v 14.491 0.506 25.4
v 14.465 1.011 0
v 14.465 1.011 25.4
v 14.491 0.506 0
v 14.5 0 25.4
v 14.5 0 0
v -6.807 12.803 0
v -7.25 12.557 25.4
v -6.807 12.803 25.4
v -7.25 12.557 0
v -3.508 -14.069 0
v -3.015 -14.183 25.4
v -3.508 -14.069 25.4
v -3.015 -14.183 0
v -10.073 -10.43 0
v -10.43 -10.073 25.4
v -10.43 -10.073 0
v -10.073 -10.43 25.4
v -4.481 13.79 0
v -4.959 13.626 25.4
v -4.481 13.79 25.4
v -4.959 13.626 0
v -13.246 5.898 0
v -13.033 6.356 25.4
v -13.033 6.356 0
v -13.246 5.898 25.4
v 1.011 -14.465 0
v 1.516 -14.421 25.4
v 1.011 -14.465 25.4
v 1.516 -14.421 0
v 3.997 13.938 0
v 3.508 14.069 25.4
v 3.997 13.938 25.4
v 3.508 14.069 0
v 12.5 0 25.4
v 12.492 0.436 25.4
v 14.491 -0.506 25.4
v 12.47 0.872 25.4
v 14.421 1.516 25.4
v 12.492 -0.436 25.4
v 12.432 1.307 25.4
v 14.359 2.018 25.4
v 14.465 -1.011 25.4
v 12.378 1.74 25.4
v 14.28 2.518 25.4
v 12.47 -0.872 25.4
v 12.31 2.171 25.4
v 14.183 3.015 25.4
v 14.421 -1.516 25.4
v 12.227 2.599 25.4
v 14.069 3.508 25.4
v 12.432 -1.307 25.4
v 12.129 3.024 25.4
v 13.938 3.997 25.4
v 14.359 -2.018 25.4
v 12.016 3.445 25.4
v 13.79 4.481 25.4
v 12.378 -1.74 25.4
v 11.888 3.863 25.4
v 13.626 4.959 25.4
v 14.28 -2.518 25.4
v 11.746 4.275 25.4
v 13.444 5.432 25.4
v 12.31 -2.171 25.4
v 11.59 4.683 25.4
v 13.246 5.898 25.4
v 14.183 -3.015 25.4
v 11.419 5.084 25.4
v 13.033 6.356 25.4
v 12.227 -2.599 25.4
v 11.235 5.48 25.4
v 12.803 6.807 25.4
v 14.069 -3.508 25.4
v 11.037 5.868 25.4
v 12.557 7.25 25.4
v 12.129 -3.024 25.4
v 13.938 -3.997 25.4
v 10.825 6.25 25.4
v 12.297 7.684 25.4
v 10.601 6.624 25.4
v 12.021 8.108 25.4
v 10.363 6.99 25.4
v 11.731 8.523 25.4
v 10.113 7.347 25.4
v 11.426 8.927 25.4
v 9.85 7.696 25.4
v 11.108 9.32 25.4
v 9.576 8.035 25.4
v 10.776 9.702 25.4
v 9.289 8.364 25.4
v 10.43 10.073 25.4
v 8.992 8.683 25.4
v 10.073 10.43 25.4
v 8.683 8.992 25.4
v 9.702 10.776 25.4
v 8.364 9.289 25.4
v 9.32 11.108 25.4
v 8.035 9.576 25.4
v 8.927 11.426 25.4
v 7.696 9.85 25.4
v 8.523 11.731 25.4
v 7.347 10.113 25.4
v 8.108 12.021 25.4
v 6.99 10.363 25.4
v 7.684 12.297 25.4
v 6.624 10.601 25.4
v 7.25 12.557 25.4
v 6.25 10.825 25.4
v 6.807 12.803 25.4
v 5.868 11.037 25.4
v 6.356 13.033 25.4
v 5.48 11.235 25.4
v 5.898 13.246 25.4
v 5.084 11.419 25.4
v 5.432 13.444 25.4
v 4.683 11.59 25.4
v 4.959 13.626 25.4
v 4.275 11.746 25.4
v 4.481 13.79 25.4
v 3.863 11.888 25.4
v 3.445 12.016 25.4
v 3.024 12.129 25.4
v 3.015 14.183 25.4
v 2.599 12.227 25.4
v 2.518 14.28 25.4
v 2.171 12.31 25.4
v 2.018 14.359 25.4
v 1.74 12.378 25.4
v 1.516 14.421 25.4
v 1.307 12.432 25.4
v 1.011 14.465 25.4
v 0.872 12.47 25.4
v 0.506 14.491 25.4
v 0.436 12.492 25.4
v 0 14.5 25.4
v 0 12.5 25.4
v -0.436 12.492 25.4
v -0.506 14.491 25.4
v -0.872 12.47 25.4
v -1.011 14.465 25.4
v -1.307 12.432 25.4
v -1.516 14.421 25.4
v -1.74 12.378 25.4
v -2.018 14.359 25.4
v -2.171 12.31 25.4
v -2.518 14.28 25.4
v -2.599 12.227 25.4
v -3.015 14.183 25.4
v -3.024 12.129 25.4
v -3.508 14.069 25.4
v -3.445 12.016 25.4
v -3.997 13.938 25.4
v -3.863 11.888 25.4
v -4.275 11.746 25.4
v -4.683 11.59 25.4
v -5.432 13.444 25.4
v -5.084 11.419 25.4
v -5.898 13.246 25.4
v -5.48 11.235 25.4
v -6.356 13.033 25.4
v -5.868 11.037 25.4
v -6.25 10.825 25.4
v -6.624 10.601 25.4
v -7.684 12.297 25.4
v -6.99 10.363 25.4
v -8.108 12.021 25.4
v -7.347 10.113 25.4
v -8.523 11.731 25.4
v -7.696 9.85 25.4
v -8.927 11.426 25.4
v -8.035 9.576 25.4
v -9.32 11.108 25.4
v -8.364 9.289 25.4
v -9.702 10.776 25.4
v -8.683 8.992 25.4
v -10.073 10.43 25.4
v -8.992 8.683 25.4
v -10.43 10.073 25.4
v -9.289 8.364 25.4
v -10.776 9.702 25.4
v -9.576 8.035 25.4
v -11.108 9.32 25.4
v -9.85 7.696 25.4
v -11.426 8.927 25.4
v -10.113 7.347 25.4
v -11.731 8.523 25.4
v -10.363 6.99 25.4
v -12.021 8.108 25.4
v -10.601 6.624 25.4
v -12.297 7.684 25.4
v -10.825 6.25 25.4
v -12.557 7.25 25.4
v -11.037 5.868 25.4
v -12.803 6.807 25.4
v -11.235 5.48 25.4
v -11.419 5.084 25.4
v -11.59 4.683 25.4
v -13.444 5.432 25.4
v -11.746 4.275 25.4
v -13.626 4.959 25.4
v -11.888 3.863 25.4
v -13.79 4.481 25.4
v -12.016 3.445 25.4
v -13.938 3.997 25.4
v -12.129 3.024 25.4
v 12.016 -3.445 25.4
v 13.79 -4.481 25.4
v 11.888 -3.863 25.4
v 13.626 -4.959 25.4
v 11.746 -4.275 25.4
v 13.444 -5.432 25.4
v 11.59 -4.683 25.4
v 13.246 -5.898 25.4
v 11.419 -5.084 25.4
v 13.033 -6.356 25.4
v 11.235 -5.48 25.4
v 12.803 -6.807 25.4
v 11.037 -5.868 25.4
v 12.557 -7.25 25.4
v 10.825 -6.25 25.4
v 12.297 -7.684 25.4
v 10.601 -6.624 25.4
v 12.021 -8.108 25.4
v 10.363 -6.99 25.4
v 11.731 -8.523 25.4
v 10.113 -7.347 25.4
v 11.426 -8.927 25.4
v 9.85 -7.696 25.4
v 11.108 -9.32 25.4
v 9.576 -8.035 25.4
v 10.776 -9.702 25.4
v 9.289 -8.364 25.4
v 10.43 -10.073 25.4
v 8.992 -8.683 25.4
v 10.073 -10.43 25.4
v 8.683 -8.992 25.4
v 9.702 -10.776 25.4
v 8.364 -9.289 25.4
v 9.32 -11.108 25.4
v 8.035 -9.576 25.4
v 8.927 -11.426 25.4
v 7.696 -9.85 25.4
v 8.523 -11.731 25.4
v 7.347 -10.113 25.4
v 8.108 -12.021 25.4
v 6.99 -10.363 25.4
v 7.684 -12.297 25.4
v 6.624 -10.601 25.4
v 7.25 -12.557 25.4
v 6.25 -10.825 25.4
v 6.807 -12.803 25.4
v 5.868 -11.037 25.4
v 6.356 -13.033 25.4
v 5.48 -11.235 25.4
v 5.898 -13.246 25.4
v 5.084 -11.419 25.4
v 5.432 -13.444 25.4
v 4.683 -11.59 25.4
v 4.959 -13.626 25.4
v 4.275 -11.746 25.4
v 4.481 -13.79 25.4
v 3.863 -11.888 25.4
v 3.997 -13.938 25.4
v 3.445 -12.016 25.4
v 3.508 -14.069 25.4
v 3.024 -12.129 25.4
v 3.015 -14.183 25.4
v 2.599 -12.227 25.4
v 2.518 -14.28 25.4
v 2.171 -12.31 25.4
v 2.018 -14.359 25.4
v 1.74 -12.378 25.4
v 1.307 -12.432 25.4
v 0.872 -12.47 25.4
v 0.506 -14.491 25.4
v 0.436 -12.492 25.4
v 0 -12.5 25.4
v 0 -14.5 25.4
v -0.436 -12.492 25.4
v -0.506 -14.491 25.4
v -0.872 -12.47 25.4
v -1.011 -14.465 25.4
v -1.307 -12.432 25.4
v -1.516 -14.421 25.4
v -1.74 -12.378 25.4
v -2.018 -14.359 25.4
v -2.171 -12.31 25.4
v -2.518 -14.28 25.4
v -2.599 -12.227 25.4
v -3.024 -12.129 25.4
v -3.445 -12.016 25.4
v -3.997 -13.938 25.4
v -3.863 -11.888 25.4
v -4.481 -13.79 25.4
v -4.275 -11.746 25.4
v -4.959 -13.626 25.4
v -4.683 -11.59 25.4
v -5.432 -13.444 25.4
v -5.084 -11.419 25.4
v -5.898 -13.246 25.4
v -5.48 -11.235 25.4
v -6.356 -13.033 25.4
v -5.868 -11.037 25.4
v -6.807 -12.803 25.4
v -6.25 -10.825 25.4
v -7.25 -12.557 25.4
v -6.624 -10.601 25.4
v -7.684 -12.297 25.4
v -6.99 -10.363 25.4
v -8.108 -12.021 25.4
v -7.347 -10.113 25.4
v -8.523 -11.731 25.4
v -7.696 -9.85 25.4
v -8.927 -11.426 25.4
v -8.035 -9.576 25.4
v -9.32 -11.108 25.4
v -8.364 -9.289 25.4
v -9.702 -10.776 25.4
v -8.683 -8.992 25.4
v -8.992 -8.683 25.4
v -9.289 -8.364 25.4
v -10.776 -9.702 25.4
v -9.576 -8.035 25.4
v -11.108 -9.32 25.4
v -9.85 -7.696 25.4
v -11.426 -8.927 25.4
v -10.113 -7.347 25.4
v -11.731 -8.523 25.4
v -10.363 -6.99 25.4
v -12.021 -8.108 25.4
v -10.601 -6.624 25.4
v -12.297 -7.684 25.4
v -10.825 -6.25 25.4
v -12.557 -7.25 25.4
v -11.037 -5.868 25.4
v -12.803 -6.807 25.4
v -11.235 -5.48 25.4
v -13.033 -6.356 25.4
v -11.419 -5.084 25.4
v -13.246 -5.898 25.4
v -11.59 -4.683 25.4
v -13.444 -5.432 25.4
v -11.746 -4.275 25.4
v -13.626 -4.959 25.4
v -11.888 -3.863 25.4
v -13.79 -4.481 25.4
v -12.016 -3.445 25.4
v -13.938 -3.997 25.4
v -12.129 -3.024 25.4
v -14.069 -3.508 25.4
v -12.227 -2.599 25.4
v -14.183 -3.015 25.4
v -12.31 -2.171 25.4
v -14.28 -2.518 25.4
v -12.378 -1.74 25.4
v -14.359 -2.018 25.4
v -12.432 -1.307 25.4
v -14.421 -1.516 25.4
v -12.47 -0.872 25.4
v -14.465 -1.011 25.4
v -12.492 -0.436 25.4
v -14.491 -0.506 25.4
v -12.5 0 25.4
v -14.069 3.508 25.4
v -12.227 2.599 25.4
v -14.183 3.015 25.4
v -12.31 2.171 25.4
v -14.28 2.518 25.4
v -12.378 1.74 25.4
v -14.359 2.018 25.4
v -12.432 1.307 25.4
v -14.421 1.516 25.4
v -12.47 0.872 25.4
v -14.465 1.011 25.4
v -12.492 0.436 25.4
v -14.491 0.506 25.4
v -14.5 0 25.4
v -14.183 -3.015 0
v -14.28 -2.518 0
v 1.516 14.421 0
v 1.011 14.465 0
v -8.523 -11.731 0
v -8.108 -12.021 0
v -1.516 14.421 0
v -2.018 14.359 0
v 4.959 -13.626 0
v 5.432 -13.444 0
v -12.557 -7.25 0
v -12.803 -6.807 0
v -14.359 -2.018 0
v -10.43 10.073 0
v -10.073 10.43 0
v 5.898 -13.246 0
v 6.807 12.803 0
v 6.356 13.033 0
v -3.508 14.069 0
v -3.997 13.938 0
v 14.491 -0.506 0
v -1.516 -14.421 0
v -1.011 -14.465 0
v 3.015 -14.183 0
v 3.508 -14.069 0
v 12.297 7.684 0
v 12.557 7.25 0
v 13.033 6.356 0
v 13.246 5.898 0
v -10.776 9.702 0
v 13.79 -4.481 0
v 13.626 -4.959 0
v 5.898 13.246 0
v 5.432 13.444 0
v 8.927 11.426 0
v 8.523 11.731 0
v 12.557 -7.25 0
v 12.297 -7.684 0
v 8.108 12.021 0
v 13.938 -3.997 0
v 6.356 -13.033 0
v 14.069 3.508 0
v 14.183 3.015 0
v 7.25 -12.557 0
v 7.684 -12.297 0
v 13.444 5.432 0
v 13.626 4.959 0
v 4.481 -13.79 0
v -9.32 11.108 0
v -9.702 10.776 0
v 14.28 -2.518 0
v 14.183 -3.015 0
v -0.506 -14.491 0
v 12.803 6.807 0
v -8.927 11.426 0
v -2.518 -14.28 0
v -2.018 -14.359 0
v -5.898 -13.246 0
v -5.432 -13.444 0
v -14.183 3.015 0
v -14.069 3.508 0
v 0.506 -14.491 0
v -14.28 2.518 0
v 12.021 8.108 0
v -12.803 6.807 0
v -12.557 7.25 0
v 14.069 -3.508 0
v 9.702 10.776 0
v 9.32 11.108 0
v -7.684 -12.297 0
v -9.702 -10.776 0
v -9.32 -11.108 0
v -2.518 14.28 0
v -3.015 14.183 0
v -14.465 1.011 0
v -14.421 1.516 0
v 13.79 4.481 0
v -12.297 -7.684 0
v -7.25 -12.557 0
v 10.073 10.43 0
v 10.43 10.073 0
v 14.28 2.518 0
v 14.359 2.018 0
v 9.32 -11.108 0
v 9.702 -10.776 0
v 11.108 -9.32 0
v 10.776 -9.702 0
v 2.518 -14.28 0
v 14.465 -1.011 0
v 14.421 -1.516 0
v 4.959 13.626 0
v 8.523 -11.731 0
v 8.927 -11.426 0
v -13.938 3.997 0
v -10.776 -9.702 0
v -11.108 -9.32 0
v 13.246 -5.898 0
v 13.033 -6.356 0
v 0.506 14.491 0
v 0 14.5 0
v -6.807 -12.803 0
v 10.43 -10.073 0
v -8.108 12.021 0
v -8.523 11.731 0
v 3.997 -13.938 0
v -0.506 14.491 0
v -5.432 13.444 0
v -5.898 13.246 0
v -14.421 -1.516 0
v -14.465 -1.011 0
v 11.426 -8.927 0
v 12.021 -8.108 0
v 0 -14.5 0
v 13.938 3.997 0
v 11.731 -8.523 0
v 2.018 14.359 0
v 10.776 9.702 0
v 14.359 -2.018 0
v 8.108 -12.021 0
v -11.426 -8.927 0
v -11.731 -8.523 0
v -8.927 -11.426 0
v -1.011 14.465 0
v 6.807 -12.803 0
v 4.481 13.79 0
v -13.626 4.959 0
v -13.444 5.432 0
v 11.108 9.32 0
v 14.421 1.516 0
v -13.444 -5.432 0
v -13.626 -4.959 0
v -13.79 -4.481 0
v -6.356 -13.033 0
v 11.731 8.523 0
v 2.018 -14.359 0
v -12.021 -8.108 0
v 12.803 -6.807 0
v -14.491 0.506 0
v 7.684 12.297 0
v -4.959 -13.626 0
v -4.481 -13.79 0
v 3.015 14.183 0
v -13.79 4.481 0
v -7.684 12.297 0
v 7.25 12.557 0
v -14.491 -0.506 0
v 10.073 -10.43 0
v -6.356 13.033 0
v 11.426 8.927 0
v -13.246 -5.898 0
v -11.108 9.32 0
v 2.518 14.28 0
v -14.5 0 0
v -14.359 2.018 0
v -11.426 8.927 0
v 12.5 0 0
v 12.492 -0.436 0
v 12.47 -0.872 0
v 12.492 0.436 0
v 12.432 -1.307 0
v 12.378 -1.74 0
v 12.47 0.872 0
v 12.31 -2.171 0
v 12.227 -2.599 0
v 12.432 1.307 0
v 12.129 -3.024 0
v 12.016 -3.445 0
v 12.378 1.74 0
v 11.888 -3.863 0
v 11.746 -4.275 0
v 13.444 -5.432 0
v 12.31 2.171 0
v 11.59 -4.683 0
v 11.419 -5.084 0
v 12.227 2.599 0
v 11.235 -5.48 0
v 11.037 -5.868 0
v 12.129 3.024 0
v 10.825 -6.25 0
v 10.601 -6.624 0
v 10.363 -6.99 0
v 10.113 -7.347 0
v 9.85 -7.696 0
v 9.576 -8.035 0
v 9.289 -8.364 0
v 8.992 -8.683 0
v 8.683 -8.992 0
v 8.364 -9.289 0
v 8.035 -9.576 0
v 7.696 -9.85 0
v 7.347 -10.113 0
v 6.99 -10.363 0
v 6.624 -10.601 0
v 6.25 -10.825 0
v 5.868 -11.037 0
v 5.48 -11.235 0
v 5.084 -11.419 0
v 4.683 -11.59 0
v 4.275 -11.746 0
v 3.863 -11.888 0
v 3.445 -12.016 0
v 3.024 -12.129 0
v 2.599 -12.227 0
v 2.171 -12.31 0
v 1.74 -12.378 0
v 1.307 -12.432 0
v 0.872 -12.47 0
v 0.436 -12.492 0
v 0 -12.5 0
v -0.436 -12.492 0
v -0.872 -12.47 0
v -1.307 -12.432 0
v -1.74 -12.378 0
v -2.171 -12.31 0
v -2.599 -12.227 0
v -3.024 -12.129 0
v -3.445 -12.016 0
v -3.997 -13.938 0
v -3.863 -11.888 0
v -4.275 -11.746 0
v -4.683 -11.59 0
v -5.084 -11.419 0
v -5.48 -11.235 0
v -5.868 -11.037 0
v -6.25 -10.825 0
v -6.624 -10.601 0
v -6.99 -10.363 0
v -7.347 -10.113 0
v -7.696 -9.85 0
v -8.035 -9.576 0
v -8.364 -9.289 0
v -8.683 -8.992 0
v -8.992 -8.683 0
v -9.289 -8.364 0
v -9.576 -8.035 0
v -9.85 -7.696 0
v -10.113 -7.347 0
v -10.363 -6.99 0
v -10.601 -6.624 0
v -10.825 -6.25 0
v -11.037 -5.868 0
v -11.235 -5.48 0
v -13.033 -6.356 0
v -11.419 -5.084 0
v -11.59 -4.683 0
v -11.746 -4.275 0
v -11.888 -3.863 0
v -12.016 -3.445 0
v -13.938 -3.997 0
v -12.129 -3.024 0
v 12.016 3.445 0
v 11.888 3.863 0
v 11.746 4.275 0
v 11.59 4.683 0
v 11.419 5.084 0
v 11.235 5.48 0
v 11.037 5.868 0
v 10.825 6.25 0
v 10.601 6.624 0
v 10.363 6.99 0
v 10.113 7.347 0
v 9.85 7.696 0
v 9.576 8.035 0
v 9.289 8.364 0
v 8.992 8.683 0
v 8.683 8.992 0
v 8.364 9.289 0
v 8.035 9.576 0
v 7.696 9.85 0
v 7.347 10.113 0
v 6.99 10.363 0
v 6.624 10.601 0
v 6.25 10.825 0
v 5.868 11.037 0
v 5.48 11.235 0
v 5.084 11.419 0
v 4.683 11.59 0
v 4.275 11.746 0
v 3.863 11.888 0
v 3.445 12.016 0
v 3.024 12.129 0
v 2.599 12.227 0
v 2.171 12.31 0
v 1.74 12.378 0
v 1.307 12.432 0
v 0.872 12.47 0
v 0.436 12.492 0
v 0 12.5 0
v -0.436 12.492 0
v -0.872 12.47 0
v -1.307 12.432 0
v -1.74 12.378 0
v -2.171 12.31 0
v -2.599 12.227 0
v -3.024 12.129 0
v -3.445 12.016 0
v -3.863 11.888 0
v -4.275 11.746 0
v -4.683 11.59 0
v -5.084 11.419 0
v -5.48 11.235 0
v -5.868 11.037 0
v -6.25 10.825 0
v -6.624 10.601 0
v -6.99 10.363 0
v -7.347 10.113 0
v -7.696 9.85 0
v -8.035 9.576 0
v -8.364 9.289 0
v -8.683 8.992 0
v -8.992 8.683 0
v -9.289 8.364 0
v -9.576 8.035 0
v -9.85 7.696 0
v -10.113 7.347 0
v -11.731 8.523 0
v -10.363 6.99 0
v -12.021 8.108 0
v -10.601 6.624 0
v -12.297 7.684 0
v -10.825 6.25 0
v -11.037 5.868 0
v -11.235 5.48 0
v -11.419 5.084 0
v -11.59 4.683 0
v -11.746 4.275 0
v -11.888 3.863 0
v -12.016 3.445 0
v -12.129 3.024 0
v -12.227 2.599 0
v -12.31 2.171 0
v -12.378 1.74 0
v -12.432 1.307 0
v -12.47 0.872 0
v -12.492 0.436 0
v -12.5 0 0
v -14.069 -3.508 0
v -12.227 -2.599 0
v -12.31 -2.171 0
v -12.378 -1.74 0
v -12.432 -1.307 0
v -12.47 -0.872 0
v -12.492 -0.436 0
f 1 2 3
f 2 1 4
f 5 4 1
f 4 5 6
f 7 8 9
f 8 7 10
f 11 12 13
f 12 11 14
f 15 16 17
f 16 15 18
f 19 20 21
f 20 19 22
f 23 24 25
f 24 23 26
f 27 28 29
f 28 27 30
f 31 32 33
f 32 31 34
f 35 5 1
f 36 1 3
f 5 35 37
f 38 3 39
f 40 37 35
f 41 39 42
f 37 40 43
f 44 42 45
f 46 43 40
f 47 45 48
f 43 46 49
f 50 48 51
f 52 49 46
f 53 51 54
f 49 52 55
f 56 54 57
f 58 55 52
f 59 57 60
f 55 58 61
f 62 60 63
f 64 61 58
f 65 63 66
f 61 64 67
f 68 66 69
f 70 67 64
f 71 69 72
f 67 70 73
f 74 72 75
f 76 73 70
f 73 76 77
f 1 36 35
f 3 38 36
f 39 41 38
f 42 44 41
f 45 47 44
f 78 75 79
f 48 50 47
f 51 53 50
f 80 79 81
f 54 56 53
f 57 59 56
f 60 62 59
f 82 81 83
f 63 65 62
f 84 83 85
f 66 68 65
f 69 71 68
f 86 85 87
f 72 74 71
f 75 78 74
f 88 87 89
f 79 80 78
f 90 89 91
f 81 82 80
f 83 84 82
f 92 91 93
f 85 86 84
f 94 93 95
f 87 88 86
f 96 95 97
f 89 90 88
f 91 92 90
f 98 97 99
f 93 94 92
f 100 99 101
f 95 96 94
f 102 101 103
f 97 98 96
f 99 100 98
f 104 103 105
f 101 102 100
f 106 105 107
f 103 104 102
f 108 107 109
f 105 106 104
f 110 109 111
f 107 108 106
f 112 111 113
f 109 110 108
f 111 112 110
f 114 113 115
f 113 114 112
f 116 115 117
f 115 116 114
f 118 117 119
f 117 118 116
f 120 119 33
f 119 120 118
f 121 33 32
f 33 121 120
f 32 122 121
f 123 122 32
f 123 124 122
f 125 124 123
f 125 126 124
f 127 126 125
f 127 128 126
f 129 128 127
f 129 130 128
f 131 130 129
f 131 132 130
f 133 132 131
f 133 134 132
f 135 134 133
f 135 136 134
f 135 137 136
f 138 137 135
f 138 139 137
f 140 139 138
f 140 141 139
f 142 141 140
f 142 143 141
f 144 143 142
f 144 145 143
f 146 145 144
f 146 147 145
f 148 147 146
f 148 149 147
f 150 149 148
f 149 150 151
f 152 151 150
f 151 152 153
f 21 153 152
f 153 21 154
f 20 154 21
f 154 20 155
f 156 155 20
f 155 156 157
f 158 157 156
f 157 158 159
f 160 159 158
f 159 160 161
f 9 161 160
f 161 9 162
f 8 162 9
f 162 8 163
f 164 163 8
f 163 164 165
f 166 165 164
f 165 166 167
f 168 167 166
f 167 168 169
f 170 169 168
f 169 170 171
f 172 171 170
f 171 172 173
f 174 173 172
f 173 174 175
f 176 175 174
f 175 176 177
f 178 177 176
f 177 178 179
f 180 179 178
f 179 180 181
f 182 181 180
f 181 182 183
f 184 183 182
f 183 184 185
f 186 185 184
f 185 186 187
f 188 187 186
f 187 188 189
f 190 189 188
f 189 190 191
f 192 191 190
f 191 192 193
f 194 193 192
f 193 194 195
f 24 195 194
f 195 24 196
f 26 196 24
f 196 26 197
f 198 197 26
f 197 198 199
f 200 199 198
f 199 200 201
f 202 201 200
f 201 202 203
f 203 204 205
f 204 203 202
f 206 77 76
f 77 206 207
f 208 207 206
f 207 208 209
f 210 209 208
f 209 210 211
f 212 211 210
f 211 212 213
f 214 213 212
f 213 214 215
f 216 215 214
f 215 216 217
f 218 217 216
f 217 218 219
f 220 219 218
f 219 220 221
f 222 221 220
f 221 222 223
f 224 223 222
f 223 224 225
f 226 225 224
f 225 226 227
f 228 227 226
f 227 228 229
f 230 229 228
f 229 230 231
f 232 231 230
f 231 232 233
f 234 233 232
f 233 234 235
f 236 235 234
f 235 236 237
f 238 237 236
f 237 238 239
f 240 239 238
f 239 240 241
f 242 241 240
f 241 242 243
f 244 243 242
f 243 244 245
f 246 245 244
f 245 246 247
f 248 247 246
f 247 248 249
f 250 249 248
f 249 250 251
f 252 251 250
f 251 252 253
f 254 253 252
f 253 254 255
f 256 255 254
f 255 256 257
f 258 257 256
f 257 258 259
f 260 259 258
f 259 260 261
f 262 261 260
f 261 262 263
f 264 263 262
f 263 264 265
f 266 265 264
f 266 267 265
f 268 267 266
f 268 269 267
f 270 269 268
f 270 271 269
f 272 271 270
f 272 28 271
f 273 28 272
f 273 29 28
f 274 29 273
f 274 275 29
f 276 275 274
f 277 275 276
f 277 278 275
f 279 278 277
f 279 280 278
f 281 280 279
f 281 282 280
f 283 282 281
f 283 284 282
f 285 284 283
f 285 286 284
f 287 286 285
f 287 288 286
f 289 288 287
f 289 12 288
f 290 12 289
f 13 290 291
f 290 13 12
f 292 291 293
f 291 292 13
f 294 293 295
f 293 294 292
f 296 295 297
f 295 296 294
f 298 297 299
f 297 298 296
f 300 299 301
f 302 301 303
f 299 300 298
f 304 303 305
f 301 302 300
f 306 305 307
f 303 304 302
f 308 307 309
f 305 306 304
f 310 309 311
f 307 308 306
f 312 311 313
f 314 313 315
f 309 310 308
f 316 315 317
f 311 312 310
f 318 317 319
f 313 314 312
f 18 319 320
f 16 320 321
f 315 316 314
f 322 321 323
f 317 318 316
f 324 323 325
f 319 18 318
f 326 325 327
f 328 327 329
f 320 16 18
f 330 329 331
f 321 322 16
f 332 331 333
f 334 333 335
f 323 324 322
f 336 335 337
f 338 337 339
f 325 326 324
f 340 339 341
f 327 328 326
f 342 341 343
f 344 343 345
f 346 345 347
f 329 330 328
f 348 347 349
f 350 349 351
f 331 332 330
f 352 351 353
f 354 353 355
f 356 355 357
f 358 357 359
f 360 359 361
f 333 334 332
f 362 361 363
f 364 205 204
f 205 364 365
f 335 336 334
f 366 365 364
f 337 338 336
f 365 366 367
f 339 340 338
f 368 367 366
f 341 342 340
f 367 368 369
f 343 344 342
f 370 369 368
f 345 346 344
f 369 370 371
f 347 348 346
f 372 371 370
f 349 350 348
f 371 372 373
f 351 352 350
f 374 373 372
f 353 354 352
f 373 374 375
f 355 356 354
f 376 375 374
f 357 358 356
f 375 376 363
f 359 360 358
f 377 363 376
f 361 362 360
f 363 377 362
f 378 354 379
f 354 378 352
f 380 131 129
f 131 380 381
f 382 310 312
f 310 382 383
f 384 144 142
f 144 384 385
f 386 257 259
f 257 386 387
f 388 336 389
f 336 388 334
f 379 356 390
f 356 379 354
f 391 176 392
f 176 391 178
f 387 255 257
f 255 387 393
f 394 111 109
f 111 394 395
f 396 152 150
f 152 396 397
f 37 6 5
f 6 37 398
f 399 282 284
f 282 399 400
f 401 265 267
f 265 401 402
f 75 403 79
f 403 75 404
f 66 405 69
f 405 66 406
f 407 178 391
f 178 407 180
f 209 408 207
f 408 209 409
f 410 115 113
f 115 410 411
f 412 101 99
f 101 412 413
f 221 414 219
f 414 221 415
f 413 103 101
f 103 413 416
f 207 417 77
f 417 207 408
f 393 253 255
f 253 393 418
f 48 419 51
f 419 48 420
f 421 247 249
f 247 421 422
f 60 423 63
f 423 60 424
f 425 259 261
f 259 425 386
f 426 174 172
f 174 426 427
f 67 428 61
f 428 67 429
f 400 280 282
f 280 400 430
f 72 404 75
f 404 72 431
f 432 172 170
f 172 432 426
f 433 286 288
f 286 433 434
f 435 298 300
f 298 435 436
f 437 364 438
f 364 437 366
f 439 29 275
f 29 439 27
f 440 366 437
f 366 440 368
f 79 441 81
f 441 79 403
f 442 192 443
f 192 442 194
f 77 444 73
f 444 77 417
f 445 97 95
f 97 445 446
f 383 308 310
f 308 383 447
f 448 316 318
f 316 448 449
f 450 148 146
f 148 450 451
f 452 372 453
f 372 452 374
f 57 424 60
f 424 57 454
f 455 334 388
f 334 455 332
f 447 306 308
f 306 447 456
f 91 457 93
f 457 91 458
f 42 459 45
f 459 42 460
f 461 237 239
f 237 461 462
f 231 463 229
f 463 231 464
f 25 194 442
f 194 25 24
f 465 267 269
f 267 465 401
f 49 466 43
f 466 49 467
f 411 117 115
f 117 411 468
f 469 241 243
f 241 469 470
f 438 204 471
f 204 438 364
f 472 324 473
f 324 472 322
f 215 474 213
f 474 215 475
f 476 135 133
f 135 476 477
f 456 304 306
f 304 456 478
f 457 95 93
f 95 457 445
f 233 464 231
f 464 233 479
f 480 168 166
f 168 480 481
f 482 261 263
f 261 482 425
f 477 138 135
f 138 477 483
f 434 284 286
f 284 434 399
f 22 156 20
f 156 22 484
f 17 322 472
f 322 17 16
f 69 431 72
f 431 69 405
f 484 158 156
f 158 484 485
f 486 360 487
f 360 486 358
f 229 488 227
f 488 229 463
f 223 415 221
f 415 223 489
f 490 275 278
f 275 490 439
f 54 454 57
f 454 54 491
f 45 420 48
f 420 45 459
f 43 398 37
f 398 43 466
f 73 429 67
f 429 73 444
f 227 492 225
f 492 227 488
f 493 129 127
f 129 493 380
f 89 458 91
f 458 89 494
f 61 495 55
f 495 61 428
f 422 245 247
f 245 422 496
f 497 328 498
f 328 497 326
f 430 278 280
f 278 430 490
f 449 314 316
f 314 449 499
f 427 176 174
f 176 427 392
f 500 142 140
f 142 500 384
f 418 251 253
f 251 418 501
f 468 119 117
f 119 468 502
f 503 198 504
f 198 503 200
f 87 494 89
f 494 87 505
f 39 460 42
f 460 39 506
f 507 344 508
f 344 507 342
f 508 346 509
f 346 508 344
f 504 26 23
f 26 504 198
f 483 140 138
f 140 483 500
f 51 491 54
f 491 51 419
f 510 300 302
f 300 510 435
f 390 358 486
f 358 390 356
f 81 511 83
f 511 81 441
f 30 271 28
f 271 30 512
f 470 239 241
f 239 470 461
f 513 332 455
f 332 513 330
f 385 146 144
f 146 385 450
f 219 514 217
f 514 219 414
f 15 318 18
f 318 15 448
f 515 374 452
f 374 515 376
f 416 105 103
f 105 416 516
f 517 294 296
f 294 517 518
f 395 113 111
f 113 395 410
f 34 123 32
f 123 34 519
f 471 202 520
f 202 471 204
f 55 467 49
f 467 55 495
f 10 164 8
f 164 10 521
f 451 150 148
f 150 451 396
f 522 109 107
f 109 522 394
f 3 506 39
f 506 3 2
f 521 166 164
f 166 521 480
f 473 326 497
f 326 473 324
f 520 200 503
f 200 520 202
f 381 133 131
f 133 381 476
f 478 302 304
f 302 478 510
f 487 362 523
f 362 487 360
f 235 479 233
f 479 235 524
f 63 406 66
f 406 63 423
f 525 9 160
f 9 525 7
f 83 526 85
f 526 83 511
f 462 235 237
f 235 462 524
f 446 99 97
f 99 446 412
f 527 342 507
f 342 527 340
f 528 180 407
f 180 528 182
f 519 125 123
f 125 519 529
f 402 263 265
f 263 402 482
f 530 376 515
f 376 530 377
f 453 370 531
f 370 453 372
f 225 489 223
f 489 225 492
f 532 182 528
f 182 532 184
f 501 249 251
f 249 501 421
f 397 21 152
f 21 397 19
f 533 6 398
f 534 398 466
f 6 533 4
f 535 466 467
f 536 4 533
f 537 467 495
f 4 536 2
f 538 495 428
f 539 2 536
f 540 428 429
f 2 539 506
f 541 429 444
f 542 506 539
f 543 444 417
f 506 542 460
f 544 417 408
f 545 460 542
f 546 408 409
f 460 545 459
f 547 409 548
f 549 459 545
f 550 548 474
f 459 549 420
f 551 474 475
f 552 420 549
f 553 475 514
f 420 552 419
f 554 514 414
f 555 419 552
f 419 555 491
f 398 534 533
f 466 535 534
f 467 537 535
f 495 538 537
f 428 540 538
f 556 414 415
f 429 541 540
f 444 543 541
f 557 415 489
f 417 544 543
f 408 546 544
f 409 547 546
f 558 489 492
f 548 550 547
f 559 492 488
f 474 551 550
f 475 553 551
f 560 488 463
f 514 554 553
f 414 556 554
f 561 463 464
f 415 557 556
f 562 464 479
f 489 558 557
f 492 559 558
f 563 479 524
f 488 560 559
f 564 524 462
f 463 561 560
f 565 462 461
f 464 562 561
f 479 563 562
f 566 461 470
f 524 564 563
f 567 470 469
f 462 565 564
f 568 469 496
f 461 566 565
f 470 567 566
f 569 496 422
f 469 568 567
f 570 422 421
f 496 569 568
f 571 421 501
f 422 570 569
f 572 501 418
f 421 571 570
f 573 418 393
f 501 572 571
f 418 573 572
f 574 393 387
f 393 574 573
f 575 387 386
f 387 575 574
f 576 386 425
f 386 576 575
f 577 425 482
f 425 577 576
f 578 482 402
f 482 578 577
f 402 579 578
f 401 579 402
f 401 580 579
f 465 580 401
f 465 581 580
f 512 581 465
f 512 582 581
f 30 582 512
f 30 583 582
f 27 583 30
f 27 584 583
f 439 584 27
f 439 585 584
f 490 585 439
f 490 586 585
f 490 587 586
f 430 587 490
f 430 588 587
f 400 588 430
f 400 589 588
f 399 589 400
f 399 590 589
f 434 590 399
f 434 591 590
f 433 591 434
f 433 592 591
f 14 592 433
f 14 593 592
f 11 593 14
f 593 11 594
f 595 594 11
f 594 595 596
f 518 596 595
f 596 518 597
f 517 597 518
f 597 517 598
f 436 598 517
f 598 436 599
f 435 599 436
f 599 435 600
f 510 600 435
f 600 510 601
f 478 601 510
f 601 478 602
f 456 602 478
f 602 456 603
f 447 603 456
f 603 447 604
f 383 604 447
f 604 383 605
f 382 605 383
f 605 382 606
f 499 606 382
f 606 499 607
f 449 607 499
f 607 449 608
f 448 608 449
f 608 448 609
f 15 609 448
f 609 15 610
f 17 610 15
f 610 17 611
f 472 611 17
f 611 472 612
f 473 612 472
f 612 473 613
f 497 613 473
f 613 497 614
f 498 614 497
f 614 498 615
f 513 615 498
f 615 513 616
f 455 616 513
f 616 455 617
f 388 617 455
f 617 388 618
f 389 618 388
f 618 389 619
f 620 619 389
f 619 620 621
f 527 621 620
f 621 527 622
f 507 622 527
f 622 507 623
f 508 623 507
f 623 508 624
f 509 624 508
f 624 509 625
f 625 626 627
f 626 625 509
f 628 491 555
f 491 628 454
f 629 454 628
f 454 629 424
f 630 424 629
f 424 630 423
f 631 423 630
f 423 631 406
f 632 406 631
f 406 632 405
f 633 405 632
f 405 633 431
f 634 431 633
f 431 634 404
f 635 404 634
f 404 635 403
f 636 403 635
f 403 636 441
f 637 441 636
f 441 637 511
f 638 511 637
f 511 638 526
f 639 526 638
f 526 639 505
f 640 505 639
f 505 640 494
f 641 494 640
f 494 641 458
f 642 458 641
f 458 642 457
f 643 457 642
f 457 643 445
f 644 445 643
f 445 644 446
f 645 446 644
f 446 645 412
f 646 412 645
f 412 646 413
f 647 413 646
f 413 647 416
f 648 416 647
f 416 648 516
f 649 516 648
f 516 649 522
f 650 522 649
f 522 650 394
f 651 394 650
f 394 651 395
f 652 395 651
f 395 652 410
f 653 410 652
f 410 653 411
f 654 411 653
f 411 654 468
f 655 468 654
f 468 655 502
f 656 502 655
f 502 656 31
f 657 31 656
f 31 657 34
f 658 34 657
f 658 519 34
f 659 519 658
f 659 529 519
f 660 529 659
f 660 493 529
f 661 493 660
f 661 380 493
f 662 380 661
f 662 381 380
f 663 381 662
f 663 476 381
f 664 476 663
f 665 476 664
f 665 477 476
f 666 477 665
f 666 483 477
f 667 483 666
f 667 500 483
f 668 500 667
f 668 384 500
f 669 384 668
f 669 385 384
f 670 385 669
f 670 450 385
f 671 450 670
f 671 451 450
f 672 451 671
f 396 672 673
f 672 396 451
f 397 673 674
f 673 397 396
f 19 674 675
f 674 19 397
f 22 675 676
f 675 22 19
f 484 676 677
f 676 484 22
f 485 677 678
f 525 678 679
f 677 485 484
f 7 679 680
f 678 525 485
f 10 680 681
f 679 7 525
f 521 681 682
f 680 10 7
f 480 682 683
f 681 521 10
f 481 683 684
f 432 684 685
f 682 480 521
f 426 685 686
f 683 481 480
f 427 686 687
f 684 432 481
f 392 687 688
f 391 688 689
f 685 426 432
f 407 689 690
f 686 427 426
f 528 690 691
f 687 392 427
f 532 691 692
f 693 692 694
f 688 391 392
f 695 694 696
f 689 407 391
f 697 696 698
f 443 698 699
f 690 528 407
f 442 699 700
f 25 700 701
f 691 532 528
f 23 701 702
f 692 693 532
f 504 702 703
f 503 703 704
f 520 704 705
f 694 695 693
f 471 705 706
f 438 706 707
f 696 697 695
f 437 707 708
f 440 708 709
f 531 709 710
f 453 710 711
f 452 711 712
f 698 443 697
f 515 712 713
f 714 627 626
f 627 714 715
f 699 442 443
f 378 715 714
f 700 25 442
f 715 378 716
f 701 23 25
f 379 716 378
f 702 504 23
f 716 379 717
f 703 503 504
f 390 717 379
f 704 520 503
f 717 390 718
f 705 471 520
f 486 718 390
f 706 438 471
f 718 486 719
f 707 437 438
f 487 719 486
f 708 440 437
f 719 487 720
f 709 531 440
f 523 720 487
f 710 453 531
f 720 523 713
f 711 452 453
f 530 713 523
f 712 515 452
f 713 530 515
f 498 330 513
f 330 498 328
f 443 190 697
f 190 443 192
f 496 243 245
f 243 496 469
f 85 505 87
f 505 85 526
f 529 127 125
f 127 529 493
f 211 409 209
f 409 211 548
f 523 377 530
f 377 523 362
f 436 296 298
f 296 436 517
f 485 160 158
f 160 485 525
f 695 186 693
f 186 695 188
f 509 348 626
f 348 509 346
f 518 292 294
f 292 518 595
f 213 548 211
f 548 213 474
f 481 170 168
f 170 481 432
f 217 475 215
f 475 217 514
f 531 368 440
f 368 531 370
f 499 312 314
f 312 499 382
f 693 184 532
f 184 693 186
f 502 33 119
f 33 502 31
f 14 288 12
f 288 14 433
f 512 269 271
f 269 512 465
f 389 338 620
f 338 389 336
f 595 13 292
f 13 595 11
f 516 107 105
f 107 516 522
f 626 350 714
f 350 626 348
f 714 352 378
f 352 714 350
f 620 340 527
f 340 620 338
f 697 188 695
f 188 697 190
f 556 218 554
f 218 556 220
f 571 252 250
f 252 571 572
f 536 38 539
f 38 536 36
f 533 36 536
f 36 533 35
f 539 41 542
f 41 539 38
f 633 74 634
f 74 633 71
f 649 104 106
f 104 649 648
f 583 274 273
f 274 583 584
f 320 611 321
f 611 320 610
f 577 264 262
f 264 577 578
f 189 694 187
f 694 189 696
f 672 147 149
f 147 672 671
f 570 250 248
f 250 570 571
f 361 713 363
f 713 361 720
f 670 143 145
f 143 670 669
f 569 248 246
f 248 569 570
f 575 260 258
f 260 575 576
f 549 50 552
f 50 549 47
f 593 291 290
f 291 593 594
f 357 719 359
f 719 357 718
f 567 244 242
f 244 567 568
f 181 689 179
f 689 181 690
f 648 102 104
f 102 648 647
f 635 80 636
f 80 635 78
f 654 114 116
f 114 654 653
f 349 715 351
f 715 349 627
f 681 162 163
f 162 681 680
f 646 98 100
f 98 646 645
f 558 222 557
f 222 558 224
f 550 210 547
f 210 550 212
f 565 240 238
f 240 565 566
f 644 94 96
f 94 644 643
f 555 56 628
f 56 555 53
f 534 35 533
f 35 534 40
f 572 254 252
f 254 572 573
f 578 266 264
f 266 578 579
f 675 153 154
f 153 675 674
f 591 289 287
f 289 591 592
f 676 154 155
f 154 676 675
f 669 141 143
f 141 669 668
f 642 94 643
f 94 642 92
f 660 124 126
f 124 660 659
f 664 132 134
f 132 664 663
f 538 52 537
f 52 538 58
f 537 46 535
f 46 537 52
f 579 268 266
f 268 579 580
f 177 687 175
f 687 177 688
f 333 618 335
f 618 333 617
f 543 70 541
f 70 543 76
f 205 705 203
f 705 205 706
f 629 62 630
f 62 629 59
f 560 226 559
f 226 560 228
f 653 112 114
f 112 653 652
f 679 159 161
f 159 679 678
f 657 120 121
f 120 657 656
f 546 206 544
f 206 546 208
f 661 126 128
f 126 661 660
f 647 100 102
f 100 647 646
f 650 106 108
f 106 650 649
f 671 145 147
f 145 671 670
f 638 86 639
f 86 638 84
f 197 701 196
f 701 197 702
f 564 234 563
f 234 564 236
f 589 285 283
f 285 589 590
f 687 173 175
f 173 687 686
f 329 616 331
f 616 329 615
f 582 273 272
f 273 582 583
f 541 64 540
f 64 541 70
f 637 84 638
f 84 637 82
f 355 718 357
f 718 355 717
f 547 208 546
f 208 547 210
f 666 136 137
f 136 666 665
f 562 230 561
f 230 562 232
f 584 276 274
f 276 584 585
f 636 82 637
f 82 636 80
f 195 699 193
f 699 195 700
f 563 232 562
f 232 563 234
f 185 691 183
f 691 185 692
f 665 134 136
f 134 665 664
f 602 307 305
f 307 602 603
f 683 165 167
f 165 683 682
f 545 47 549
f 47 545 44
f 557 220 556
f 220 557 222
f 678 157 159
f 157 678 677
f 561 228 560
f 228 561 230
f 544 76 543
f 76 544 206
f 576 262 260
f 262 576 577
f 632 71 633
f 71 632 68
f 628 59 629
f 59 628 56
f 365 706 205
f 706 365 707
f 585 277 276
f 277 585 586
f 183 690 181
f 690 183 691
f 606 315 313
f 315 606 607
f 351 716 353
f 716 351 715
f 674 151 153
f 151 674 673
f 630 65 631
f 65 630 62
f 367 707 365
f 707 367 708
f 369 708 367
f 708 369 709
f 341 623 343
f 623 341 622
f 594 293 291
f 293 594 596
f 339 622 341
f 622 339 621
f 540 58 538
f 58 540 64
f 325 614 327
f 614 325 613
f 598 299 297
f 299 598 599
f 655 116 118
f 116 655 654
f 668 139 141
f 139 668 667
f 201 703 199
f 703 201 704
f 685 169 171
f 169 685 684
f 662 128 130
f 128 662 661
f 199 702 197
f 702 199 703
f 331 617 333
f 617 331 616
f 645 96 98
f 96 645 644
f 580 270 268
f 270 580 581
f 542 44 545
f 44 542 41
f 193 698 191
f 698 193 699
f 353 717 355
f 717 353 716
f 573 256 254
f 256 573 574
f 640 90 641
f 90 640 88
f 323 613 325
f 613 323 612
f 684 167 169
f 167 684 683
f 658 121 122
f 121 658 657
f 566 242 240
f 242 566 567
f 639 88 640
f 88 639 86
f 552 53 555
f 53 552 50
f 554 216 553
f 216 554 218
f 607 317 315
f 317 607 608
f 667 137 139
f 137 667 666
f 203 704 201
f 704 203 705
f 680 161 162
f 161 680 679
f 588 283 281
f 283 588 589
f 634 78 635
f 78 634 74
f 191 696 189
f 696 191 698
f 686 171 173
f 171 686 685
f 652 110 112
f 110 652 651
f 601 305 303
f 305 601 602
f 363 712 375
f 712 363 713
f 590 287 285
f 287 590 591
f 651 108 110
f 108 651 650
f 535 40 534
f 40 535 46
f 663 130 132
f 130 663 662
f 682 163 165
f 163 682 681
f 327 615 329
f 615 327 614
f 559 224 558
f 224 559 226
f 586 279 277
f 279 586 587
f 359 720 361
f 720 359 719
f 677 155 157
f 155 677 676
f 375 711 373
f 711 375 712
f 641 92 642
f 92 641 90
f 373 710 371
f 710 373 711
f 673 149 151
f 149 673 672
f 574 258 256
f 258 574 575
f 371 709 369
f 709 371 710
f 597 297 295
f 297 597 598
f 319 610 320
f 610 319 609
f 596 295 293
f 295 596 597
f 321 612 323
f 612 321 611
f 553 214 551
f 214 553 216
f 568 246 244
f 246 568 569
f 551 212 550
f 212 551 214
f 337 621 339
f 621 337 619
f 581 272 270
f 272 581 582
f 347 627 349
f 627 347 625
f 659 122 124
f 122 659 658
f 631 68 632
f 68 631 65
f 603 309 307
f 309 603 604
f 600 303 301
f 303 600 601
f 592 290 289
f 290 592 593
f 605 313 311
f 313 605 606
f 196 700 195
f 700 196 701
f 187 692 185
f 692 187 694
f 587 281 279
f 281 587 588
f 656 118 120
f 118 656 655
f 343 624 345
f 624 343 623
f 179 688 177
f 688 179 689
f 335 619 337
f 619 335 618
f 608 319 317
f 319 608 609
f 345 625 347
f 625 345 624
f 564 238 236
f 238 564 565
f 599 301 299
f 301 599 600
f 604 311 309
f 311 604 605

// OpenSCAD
// file: ../shapes.scad
FACES   = 180;
EPSILON = 0.1;
PIN	    = 2.54;


module tube(h=1, inner=0, outer=0, di=0, do=0) {
    rInner = inner > 0 ? inner : di / 2;
    rOuter = outer > 0 ? outer : do / 2;

	if (rInner >= rOuter) echo("ERROR in tube. rOuter must be > rInner.");

	difference() {
		cylinder(h=h, r=rOuter);
		translate([0,0,-EPSILON]) {
			cylinder(h=h + EPSILON*2, r=rInner);
		}
	}
}

module roundedRect(h, d)
{
	D0 = d * 0.8;
	D1 = d * 0.2;
	H = h;

	hull()
	{
		translate([-D0/2, -D0/2, 0]) {
			cube([D0, D0, H]);
		}
		translate([-D0/2, -D0/2, 0])  cylinder(d=D1, h=H);
		translate([ D0/2, -D0/2, 0])  cylinder(d=D1, h=H);
		translate([-D0/2,  D0/2, 0])  cylinder(d=D1, h=H);
		translate([ D0/2,  D0/2, 0])  cylinder(d=D1, h=H);
	}
}

module cubePair(x, size)
{
	translate([x, 0, 0])
		cube(size=size);
	mirror([1,0,0]) translate([x, 0, 0])
		cube(size=size);
}

module polygonXY(h, points)
{
    linear_extrude(height = h) {
        polygon(points=points);
    }  
}

module polygonYZ(h, points)
{
    multmatrix(m = [ [0, 0, 1, 0],
    				 [1, 0, 0, 0],
    				 [0, 1, 0, 0],
    				 [0, 0, 0, 1]
       			   ])
    linear_extrude(height = h) {
        polygon(points=points);
    }  	
}

module polygonXZ(h, points)
{
    multmatrix(m = [ [1, 0, 0, 0],
    				 [0, 0, 1, 0],
    				 [0, 1, 0, 0],
    				 [0, 0, 0, 1]
       			   ])
    linear_extrude(height = h) {
        polygon(points=points);
    }  	
}


////////////////
// DEPRECATED //
////////////////

module shelf(_r0, _h, _r1) {
	rotate_extrude($fn=FACES) {
		polygon([[_r0, 0], [_r1, _h], [_r0, _h]]);
	}
}


module pinsAtTube(r, h, nX, nY, longY)
{
	OFFSET = sqrt(r * r - PIN * PIN * nX * nX / 4);

	Y = longY ? 40 : PIN * nY;

    translate([-nX * PIN / 2, OFFSET - PIN * nY, 0]) {
        cube([nX * PIN, Y, h]);
    }	
}
// main file
use <../shapes.scad>

$fn = 180;

T = 4;

DO = 29.0;
tube(h=25.4, do=DO, di=DO - T);
